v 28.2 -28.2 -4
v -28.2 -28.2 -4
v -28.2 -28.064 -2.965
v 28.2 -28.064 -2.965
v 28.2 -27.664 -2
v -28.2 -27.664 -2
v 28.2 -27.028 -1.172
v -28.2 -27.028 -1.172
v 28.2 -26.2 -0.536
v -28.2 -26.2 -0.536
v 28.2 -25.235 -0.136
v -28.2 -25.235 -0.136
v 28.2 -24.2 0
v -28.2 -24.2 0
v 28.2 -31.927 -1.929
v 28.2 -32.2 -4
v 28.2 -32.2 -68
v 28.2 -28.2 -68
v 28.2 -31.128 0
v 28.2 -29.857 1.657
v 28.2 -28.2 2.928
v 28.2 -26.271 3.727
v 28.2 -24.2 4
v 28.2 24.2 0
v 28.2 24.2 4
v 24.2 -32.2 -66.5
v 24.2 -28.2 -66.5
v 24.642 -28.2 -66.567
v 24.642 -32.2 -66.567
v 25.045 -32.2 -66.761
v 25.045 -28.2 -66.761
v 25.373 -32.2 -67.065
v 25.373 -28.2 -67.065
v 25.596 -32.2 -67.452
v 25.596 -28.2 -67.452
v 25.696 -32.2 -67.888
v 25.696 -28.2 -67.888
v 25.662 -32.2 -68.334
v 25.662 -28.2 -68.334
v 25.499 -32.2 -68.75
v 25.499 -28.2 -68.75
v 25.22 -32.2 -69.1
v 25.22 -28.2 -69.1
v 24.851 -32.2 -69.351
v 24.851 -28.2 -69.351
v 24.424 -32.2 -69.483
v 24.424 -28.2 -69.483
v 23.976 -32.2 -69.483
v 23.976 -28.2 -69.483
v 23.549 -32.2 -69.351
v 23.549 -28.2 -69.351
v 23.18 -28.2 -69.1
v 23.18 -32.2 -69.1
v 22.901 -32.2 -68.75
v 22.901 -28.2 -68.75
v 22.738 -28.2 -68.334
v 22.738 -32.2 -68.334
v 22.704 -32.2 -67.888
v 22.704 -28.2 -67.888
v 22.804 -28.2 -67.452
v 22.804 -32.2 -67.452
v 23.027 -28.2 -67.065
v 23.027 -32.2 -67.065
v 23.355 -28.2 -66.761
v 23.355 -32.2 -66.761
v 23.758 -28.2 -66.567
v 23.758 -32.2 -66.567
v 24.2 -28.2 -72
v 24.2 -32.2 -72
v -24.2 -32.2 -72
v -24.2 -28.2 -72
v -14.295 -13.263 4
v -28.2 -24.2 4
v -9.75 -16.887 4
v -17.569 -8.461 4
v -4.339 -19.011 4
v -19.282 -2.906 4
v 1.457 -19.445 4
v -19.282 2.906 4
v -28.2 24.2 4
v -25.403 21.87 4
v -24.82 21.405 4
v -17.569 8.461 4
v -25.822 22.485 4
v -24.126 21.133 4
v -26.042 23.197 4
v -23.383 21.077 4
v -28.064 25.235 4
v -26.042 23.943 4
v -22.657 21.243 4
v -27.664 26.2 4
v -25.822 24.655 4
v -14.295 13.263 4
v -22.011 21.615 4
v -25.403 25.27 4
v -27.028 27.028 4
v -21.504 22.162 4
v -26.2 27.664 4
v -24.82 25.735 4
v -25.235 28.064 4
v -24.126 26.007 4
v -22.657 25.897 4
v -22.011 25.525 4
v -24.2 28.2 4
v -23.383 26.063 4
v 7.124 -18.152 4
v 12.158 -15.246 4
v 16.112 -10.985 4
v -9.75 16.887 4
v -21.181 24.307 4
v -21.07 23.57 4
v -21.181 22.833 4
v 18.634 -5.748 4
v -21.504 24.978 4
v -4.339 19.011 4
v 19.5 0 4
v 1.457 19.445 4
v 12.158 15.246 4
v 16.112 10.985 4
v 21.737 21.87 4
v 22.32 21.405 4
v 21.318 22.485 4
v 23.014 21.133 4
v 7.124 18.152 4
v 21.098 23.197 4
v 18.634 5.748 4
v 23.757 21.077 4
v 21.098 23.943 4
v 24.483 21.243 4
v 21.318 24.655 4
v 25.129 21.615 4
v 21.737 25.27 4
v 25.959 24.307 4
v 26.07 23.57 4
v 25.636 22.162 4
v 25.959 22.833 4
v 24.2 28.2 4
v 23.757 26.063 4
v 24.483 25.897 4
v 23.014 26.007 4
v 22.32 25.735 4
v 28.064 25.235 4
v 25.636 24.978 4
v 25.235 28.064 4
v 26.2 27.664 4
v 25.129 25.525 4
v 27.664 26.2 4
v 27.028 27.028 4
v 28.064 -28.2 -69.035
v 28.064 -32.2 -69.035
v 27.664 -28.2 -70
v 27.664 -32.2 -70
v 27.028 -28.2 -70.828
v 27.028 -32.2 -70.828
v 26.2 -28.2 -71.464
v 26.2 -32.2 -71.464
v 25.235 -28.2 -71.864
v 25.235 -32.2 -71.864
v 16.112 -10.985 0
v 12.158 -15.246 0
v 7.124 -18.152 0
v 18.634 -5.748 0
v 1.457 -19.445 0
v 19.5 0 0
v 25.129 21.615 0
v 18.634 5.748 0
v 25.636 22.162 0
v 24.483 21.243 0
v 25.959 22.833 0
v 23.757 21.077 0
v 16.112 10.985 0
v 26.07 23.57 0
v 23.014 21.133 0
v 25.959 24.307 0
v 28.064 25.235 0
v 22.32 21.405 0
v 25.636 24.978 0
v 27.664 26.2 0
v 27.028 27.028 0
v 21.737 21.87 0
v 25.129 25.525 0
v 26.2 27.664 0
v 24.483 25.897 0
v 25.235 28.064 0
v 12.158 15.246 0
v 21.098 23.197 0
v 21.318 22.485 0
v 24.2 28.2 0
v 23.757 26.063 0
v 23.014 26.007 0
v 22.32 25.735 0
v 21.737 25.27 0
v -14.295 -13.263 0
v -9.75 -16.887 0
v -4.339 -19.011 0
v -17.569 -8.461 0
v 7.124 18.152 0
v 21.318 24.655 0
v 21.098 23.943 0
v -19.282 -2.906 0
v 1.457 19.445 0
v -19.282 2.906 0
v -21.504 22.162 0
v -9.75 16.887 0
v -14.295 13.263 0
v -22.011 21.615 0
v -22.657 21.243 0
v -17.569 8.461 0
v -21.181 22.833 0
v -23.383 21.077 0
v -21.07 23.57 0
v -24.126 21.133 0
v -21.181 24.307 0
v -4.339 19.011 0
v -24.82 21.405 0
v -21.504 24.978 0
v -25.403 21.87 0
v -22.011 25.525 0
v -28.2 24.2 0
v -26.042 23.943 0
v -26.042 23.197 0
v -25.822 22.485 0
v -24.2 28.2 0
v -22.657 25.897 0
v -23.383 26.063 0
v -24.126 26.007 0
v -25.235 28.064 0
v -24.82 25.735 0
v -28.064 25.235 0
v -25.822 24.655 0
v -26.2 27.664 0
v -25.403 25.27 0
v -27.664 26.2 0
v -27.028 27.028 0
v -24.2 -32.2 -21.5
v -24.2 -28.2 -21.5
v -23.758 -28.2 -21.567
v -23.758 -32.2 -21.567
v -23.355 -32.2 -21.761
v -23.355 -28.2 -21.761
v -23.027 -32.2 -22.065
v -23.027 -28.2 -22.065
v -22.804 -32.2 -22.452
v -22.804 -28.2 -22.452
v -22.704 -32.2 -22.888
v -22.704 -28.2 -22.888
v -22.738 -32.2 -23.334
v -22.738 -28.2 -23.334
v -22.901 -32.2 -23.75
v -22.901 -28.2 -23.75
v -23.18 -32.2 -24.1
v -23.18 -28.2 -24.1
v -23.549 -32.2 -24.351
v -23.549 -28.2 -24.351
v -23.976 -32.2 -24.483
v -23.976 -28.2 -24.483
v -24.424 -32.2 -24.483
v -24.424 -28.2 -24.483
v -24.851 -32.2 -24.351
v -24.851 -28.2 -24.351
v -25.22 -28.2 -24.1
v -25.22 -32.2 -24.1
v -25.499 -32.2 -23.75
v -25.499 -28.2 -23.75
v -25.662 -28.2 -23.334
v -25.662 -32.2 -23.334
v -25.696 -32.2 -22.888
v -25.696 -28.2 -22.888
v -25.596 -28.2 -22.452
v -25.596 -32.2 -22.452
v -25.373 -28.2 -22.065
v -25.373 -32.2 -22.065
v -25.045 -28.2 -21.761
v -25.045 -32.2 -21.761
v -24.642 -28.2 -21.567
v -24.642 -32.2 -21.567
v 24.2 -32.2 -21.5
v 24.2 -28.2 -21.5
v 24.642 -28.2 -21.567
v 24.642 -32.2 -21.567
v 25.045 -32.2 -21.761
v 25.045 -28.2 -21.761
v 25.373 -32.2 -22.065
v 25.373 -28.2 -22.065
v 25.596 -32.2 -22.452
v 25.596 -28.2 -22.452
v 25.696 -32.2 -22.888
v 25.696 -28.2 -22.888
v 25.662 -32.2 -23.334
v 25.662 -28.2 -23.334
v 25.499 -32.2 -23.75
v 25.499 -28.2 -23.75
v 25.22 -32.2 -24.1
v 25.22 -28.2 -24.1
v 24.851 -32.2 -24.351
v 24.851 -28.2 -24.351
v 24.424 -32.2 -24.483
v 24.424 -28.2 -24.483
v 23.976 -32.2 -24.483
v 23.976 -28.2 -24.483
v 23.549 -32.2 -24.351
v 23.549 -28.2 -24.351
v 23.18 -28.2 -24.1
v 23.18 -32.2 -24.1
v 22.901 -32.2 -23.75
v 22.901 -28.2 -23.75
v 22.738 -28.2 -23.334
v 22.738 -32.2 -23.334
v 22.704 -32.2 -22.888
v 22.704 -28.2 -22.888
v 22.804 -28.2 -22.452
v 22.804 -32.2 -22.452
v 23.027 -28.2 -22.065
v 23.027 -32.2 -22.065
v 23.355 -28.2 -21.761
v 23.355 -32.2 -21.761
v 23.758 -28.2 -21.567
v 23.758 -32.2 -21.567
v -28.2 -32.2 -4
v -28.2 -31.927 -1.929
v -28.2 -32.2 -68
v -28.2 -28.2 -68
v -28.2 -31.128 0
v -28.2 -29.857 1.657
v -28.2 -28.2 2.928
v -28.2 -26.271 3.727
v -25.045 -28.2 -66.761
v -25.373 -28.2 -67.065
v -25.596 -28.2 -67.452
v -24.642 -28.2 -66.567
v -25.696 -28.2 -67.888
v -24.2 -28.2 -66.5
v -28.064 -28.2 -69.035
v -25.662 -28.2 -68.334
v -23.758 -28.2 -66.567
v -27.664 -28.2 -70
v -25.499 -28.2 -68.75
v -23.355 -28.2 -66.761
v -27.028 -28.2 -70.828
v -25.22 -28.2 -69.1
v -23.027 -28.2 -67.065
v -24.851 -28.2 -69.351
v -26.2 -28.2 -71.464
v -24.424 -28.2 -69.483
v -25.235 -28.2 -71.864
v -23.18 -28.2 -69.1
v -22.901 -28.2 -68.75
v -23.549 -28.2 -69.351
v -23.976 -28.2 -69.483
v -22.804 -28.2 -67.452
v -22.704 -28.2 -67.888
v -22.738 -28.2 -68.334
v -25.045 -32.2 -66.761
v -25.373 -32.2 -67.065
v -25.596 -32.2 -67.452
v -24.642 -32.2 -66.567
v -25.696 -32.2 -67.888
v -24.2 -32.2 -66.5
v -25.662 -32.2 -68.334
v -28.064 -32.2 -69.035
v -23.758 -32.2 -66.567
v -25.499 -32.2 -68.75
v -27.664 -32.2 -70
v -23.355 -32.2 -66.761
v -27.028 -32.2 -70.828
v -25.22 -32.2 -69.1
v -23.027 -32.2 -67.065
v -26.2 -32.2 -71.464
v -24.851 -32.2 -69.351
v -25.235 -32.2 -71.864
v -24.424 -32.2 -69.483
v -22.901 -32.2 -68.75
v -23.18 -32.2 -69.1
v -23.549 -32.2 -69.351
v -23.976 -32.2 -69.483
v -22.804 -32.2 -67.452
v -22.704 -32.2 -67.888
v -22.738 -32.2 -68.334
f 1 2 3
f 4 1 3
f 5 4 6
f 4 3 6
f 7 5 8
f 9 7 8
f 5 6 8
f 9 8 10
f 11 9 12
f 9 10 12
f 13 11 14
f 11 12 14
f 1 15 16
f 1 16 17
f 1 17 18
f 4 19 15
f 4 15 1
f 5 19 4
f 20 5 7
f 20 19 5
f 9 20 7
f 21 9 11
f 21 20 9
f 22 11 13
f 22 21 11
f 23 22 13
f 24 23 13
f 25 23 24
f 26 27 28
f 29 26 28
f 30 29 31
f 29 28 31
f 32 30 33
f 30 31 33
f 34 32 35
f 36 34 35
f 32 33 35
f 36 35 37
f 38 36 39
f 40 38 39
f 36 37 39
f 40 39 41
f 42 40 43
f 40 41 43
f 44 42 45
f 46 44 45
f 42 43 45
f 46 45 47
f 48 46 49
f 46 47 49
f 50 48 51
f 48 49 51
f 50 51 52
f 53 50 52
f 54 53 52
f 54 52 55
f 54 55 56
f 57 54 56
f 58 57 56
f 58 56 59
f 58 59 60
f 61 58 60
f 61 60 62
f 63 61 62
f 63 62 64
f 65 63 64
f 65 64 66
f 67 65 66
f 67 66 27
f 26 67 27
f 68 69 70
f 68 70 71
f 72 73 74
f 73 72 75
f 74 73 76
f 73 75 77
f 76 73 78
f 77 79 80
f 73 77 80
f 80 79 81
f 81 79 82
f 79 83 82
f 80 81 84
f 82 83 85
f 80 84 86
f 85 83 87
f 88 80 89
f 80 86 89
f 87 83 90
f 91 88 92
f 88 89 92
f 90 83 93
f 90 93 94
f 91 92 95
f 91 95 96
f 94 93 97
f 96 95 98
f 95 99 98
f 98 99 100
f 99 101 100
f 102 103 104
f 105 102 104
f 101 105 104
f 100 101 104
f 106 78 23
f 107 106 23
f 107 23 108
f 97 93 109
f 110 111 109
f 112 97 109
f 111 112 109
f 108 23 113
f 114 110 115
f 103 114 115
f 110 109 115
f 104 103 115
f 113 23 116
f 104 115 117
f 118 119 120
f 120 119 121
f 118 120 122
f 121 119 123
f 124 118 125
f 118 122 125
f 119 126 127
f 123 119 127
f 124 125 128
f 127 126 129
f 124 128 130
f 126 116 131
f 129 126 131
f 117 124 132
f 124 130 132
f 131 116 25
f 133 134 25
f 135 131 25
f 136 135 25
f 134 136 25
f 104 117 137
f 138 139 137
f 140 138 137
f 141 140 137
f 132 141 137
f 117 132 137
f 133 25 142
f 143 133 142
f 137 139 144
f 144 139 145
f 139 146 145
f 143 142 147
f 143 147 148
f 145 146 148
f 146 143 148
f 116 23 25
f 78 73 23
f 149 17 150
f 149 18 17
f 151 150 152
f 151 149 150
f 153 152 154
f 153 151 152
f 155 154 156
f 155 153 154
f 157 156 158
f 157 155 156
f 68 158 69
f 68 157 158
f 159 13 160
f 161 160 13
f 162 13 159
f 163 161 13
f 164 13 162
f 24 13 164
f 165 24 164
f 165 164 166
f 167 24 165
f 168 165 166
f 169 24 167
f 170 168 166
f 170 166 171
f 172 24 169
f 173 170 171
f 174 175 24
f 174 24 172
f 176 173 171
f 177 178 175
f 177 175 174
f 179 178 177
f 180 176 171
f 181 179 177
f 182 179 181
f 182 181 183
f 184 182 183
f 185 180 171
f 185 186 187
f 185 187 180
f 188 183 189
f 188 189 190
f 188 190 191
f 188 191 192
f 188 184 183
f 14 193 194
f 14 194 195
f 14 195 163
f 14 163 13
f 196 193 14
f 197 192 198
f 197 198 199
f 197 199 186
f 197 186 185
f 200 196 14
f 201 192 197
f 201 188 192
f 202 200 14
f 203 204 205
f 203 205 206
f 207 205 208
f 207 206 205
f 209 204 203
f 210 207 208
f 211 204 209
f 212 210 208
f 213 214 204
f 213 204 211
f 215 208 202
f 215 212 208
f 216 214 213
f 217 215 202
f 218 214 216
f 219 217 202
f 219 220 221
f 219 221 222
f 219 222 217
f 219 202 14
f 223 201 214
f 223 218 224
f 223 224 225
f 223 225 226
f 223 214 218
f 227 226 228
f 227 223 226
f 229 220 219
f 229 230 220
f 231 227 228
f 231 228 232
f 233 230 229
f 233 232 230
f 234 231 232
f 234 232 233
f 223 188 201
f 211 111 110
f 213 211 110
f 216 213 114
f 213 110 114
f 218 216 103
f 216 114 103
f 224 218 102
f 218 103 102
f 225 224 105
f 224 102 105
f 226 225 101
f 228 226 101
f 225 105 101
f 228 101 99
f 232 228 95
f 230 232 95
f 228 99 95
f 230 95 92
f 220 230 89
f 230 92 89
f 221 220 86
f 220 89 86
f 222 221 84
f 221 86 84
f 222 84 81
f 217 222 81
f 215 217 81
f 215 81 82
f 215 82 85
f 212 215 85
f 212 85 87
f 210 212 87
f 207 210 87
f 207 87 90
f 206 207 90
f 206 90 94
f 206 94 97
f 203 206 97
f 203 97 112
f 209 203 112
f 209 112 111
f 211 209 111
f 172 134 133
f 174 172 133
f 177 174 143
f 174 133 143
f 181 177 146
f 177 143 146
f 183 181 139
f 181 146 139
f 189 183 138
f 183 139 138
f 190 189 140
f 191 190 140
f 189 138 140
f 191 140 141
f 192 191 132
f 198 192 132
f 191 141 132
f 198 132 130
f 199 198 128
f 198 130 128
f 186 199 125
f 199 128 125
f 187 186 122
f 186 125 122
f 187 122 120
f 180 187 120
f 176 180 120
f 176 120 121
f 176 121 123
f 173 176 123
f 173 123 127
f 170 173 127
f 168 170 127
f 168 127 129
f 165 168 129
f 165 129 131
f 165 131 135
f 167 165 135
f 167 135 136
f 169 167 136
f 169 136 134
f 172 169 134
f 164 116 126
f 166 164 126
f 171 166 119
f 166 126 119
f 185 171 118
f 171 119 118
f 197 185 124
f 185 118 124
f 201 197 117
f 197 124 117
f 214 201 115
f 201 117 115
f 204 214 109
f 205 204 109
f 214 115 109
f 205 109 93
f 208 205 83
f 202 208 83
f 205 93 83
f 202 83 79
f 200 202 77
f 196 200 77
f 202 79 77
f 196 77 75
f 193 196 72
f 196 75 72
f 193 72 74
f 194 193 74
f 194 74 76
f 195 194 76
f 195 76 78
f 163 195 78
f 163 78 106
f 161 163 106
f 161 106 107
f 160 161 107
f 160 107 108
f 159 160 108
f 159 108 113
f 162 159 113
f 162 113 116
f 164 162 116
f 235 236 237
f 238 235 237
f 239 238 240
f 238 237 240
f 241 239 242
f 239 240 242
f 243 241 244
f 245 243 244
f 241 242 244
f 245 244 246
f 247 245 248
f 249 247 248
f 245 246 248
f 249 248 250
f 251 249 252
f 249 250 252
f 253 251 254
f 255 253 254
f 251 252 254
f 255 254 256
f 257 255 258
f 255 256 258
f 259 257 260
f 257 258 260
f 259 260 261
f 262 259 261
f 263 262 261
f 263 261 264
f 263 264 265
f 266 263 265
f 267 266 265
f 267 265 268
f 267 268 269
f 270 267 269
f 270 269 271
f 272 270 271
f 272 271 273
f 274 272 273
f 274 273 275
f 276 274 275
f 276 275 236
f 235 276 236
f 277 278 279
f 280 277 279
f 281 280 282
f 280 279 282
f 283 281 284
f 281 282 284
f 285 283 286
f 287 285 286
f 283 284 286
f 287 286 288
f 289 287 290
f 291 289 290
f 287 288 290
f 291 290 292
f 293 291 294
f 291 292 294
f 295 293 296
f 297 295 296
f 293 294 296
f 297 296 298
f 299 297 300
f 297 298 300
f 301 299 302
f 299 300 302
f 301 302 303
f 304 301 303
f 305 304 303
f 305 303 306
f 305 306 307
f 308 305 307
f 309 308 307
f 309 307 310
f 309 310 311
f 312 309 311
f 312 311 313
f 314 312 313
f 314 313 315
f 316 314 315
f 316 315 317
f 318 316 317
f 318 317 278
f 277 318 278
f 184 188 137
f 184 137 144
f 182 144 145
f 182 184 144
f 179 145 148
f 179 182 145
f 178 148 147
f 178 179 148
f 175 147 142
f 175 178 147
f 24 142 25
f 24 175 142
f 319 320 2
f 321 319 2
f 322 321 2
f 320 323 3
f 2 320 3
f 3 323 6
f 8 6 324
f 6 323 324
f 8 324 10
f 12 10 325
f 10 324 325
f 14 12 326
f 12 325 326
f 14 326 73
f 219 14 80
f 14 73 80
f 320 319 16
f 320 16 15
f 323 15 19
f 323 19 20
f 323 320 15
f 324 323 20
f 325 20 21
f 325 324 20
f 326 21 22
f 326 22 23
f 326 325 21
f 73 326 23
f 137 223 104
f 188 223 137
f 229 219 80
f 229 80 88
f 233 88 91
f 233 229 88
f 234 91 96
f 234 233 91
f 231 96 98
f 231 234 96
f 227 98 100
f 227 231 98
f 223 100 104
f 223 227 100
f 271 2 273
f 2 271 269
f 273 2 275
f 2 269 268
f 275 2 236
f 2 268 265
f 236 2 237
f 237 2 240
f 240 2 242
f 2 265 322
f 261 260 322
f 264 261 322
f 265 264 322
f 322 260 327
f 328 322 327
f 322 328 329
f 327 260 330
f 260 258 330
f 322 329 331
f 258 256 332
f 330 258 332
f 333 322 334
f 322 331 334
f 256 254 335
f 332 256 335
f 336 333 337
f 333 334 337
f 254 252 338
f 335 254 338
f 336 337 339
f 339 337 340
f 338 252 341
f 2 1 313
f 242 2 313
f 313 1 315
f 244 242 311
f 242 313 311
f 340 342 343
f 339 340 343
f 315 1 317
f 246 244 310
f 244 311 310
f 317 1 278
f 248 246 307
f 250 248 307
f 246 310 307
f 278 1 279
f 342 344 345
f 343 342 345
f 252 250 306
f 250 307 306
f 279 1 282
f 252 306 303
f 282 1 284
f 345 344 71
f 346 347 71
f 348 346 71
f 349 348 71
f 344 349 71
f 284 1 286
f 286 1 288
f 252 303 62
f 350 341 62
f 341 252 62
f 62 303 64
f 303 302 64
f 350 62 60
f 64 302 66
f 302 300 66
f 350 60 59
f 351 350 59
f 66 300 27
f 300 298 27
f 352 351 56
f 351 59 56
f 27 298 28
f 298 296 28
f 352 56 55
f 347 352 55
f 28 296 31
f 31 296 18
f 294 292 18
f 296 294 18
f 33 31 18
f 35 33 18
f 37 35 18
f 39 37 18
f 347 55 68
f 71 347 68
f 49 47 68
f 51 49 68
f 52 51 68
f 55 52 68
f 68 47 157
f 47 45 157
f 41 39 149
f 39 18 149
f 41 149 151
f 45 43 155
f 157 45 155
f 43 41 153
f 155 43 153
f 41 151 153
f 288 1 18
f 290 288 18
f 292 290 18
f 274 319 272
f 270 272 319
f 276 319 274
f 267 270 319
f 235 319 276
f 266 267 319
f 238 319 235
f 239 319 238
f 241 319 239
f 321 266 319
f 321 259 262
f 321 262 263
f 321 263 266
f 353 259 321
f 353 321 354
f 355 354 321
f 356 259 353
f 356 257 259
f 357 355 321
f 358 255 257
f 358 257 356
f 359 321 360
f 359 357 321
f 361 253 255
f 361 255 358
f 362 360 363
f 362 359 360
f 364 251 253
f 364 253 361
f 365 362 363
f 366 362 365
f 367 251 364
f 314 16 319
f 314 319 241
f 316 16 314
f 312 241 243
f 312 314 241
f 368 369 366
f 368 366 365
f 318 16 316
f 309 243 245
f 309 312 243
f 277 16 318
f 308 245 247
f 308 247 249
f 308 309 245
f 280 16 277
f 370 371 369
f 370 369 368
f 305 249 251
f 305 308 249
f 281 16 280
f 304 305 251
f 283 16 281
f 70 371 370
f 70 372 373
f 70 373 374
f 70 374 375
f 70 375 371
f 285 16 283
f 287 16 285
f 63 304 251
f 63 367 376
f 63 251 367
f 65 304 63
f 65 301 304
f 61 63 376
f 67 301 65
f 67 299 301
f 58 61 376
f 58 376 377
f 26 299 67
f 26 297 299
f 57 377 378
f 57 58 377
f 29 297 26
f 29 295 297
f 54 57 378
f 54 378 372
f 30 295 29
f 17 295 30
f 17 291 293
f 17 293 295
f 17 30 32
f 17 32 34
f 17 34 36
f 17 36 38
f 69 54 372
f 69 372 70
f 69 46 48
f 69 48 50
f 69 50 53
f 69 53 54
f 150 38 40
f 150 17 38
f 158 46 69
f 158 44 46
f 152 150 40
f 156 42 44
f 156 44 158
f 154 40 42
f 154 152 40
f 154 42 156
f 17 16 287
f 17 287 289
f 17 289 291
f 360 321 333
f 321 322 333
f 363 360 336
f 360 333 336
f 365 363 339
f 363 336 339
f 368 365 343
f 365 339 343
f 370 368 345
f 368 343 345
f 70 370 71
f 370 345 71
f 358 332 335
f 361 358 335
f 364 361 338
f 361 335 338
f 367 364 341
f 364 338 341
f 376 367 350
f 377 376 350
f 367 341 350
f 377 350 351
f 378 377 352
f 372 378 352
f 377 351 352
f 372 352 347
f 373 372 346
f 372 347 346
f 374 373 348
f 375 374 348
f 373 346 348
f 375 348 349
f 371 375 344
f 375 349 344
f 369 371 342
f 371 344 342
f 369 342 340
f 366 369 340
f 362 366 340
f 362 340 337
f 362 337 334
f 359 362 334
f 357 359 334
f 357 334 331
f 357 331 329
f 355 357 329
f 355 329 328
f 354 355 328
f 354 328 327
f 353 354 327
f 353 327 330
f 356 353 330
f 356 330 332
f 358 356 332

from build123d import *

# Parameters (mm, degrees)
BOSS_EXTRUDE1_DEPTH    = 4
SKETCH3_W              = 76
SKETCH3_H              = 4
BOSS_EXTRUDE2_DEPTH    = 56.4
SKETCH15_R             = 2.5
SKETCH15_R_2           = 19.5
CUT_EXTRUDE3_DEPTH     = 88.224308538
FILLET4_R              = 4
SKETCH18_R             = 1.5
CUT_EXTRUDE4_DEPTH     = 96.708933752
CONVERT_SOLID2_START   = -28.2
CONVERT_SOLID2_DEPTH   = 56.4
CONVERT_SOLID2_2_DEPTH = 56.4


# Read off the part's stored shape, not the designer's step: Convert-Solid2
with BuildPart() as part:
    # Sketch1 → Boss-Extrude1 (new body)
    with BuildSketch(Plane.XY):
        with BuildLine():
            Line((28.2, -28.2), (-28.2, -28.2))
            Line((-28.2, -28.2), (-28.2, 24.2))
            ThreePointArc((-28.2, 24.2), (-27.028427125, 27.028427125), (-24.2, 28.2))
            Line((-24.2, 28.2), (24.2, 28.2))
            ThreePointArc((24.2, 28.2), (27.028427125, 27.028427125), (28.2, 24.2))
            Line((28.2, 24.2), (28.2, -28.2))
        make_face()
    extrude(amount=BOSS_EXTRUDE1_DEPTH)

    # Sketch3 → Boss-Extrude2 (add)
    with BuildSketch(Plane(origin=(28.2, 0, 0), x_dir=(0, 0, -1), z_dir=(1, 0, 0))):
        with Locations((34, -30.2)):
            Rectangle(SKETCH3_W, SKETCH3_H)
    extrude(amount=-BOSS_EXTRUDE2_DEPTH)

    # Sketch15 → Cut-Extrude3 (cut, through all)
    with BuildSketch(Plane.XY.offset(4)):
        with Locations((-23.57, 23.57)):
            Circle(SKETCH15_R)
        with Locations((23.57, 23.57)):
            Circle(SKETCH15_R)
        Circle(SKETCH15_R_2)
    extrude(amount=-CUT_EXTRUDE3_DEPTH, mode=Mode.SUBTRACT)

    # Fillet4
    fillet4_edges = [part.edges().sort_by_distance(p)[0] for p in [
        (-28.2, -30.2, -72),
        (28.2, -30.2, -72),
    ]]
    fillet(fillet4_edges, radius=FILLET4_R)

    # Sketch18 → Cut-Extrude4 (cut, through all)
    with BuildSketch(Plane(origin=(0, -28.2, 0), x_dir=(1, 0, 0), z_dir=(0, 1, 0))):
        with Locations(Location((-24.2, 68, 0), (0, 0, 270))):
            Circle(SKETCH18_R)
        with Locations(Location((24.2, 68, 0), (0, 0, 270))):
            Circle(SKETCH18_R)
        with Locations(Location((-24.2, 23, 0), (0, 0, 270))):
            Circle(SKETCH18_R)
        with Locations(Location((24.2, 23, 0), (0, 0, 270))):
            Circle(SKETCH18_R)
    extrude(amount=-CUT_EXTRUDE4_DEPTH, mode=Mode.SUBTRACT)

    # Convert-Solid2 outline → Convert-Solid2 (cut)
    with BuildSketch(Plane.YZ.offset(CONVERT_SOLID2_START)):
        with BuildLine():
            ThreePointArc((-32.2, -4), (-29.856854249, 1.656854249), (-24.2, 4))
            Line((-24.2, 4), (-32.2, 4))
            Line((-32.2, 4), (-32.2, -4))
        make_face()
    extrude(amount=CONVERT_SOLID2_DEPTH, mode=Mode.SUBTRACT)

    # Convert-Solid2 2 outline → Convert-Solid2 2 (add)
    with BuildSketch(Plane.YZ.offset(CONVERT_SOLID2_START)):
        with BuildLine():
            ThreePointArc((-28.2, -4), (-27.028427125, -1.171572875), (-24.2, 0))
            Line((-24.2, 0), (-28.2, 0))
            Line((-28.2, 0), (-28.2, -4))
        make_face()
    extrude(amount=CONVERT_SOLID2_2_DEPTH)


solid = part.part
